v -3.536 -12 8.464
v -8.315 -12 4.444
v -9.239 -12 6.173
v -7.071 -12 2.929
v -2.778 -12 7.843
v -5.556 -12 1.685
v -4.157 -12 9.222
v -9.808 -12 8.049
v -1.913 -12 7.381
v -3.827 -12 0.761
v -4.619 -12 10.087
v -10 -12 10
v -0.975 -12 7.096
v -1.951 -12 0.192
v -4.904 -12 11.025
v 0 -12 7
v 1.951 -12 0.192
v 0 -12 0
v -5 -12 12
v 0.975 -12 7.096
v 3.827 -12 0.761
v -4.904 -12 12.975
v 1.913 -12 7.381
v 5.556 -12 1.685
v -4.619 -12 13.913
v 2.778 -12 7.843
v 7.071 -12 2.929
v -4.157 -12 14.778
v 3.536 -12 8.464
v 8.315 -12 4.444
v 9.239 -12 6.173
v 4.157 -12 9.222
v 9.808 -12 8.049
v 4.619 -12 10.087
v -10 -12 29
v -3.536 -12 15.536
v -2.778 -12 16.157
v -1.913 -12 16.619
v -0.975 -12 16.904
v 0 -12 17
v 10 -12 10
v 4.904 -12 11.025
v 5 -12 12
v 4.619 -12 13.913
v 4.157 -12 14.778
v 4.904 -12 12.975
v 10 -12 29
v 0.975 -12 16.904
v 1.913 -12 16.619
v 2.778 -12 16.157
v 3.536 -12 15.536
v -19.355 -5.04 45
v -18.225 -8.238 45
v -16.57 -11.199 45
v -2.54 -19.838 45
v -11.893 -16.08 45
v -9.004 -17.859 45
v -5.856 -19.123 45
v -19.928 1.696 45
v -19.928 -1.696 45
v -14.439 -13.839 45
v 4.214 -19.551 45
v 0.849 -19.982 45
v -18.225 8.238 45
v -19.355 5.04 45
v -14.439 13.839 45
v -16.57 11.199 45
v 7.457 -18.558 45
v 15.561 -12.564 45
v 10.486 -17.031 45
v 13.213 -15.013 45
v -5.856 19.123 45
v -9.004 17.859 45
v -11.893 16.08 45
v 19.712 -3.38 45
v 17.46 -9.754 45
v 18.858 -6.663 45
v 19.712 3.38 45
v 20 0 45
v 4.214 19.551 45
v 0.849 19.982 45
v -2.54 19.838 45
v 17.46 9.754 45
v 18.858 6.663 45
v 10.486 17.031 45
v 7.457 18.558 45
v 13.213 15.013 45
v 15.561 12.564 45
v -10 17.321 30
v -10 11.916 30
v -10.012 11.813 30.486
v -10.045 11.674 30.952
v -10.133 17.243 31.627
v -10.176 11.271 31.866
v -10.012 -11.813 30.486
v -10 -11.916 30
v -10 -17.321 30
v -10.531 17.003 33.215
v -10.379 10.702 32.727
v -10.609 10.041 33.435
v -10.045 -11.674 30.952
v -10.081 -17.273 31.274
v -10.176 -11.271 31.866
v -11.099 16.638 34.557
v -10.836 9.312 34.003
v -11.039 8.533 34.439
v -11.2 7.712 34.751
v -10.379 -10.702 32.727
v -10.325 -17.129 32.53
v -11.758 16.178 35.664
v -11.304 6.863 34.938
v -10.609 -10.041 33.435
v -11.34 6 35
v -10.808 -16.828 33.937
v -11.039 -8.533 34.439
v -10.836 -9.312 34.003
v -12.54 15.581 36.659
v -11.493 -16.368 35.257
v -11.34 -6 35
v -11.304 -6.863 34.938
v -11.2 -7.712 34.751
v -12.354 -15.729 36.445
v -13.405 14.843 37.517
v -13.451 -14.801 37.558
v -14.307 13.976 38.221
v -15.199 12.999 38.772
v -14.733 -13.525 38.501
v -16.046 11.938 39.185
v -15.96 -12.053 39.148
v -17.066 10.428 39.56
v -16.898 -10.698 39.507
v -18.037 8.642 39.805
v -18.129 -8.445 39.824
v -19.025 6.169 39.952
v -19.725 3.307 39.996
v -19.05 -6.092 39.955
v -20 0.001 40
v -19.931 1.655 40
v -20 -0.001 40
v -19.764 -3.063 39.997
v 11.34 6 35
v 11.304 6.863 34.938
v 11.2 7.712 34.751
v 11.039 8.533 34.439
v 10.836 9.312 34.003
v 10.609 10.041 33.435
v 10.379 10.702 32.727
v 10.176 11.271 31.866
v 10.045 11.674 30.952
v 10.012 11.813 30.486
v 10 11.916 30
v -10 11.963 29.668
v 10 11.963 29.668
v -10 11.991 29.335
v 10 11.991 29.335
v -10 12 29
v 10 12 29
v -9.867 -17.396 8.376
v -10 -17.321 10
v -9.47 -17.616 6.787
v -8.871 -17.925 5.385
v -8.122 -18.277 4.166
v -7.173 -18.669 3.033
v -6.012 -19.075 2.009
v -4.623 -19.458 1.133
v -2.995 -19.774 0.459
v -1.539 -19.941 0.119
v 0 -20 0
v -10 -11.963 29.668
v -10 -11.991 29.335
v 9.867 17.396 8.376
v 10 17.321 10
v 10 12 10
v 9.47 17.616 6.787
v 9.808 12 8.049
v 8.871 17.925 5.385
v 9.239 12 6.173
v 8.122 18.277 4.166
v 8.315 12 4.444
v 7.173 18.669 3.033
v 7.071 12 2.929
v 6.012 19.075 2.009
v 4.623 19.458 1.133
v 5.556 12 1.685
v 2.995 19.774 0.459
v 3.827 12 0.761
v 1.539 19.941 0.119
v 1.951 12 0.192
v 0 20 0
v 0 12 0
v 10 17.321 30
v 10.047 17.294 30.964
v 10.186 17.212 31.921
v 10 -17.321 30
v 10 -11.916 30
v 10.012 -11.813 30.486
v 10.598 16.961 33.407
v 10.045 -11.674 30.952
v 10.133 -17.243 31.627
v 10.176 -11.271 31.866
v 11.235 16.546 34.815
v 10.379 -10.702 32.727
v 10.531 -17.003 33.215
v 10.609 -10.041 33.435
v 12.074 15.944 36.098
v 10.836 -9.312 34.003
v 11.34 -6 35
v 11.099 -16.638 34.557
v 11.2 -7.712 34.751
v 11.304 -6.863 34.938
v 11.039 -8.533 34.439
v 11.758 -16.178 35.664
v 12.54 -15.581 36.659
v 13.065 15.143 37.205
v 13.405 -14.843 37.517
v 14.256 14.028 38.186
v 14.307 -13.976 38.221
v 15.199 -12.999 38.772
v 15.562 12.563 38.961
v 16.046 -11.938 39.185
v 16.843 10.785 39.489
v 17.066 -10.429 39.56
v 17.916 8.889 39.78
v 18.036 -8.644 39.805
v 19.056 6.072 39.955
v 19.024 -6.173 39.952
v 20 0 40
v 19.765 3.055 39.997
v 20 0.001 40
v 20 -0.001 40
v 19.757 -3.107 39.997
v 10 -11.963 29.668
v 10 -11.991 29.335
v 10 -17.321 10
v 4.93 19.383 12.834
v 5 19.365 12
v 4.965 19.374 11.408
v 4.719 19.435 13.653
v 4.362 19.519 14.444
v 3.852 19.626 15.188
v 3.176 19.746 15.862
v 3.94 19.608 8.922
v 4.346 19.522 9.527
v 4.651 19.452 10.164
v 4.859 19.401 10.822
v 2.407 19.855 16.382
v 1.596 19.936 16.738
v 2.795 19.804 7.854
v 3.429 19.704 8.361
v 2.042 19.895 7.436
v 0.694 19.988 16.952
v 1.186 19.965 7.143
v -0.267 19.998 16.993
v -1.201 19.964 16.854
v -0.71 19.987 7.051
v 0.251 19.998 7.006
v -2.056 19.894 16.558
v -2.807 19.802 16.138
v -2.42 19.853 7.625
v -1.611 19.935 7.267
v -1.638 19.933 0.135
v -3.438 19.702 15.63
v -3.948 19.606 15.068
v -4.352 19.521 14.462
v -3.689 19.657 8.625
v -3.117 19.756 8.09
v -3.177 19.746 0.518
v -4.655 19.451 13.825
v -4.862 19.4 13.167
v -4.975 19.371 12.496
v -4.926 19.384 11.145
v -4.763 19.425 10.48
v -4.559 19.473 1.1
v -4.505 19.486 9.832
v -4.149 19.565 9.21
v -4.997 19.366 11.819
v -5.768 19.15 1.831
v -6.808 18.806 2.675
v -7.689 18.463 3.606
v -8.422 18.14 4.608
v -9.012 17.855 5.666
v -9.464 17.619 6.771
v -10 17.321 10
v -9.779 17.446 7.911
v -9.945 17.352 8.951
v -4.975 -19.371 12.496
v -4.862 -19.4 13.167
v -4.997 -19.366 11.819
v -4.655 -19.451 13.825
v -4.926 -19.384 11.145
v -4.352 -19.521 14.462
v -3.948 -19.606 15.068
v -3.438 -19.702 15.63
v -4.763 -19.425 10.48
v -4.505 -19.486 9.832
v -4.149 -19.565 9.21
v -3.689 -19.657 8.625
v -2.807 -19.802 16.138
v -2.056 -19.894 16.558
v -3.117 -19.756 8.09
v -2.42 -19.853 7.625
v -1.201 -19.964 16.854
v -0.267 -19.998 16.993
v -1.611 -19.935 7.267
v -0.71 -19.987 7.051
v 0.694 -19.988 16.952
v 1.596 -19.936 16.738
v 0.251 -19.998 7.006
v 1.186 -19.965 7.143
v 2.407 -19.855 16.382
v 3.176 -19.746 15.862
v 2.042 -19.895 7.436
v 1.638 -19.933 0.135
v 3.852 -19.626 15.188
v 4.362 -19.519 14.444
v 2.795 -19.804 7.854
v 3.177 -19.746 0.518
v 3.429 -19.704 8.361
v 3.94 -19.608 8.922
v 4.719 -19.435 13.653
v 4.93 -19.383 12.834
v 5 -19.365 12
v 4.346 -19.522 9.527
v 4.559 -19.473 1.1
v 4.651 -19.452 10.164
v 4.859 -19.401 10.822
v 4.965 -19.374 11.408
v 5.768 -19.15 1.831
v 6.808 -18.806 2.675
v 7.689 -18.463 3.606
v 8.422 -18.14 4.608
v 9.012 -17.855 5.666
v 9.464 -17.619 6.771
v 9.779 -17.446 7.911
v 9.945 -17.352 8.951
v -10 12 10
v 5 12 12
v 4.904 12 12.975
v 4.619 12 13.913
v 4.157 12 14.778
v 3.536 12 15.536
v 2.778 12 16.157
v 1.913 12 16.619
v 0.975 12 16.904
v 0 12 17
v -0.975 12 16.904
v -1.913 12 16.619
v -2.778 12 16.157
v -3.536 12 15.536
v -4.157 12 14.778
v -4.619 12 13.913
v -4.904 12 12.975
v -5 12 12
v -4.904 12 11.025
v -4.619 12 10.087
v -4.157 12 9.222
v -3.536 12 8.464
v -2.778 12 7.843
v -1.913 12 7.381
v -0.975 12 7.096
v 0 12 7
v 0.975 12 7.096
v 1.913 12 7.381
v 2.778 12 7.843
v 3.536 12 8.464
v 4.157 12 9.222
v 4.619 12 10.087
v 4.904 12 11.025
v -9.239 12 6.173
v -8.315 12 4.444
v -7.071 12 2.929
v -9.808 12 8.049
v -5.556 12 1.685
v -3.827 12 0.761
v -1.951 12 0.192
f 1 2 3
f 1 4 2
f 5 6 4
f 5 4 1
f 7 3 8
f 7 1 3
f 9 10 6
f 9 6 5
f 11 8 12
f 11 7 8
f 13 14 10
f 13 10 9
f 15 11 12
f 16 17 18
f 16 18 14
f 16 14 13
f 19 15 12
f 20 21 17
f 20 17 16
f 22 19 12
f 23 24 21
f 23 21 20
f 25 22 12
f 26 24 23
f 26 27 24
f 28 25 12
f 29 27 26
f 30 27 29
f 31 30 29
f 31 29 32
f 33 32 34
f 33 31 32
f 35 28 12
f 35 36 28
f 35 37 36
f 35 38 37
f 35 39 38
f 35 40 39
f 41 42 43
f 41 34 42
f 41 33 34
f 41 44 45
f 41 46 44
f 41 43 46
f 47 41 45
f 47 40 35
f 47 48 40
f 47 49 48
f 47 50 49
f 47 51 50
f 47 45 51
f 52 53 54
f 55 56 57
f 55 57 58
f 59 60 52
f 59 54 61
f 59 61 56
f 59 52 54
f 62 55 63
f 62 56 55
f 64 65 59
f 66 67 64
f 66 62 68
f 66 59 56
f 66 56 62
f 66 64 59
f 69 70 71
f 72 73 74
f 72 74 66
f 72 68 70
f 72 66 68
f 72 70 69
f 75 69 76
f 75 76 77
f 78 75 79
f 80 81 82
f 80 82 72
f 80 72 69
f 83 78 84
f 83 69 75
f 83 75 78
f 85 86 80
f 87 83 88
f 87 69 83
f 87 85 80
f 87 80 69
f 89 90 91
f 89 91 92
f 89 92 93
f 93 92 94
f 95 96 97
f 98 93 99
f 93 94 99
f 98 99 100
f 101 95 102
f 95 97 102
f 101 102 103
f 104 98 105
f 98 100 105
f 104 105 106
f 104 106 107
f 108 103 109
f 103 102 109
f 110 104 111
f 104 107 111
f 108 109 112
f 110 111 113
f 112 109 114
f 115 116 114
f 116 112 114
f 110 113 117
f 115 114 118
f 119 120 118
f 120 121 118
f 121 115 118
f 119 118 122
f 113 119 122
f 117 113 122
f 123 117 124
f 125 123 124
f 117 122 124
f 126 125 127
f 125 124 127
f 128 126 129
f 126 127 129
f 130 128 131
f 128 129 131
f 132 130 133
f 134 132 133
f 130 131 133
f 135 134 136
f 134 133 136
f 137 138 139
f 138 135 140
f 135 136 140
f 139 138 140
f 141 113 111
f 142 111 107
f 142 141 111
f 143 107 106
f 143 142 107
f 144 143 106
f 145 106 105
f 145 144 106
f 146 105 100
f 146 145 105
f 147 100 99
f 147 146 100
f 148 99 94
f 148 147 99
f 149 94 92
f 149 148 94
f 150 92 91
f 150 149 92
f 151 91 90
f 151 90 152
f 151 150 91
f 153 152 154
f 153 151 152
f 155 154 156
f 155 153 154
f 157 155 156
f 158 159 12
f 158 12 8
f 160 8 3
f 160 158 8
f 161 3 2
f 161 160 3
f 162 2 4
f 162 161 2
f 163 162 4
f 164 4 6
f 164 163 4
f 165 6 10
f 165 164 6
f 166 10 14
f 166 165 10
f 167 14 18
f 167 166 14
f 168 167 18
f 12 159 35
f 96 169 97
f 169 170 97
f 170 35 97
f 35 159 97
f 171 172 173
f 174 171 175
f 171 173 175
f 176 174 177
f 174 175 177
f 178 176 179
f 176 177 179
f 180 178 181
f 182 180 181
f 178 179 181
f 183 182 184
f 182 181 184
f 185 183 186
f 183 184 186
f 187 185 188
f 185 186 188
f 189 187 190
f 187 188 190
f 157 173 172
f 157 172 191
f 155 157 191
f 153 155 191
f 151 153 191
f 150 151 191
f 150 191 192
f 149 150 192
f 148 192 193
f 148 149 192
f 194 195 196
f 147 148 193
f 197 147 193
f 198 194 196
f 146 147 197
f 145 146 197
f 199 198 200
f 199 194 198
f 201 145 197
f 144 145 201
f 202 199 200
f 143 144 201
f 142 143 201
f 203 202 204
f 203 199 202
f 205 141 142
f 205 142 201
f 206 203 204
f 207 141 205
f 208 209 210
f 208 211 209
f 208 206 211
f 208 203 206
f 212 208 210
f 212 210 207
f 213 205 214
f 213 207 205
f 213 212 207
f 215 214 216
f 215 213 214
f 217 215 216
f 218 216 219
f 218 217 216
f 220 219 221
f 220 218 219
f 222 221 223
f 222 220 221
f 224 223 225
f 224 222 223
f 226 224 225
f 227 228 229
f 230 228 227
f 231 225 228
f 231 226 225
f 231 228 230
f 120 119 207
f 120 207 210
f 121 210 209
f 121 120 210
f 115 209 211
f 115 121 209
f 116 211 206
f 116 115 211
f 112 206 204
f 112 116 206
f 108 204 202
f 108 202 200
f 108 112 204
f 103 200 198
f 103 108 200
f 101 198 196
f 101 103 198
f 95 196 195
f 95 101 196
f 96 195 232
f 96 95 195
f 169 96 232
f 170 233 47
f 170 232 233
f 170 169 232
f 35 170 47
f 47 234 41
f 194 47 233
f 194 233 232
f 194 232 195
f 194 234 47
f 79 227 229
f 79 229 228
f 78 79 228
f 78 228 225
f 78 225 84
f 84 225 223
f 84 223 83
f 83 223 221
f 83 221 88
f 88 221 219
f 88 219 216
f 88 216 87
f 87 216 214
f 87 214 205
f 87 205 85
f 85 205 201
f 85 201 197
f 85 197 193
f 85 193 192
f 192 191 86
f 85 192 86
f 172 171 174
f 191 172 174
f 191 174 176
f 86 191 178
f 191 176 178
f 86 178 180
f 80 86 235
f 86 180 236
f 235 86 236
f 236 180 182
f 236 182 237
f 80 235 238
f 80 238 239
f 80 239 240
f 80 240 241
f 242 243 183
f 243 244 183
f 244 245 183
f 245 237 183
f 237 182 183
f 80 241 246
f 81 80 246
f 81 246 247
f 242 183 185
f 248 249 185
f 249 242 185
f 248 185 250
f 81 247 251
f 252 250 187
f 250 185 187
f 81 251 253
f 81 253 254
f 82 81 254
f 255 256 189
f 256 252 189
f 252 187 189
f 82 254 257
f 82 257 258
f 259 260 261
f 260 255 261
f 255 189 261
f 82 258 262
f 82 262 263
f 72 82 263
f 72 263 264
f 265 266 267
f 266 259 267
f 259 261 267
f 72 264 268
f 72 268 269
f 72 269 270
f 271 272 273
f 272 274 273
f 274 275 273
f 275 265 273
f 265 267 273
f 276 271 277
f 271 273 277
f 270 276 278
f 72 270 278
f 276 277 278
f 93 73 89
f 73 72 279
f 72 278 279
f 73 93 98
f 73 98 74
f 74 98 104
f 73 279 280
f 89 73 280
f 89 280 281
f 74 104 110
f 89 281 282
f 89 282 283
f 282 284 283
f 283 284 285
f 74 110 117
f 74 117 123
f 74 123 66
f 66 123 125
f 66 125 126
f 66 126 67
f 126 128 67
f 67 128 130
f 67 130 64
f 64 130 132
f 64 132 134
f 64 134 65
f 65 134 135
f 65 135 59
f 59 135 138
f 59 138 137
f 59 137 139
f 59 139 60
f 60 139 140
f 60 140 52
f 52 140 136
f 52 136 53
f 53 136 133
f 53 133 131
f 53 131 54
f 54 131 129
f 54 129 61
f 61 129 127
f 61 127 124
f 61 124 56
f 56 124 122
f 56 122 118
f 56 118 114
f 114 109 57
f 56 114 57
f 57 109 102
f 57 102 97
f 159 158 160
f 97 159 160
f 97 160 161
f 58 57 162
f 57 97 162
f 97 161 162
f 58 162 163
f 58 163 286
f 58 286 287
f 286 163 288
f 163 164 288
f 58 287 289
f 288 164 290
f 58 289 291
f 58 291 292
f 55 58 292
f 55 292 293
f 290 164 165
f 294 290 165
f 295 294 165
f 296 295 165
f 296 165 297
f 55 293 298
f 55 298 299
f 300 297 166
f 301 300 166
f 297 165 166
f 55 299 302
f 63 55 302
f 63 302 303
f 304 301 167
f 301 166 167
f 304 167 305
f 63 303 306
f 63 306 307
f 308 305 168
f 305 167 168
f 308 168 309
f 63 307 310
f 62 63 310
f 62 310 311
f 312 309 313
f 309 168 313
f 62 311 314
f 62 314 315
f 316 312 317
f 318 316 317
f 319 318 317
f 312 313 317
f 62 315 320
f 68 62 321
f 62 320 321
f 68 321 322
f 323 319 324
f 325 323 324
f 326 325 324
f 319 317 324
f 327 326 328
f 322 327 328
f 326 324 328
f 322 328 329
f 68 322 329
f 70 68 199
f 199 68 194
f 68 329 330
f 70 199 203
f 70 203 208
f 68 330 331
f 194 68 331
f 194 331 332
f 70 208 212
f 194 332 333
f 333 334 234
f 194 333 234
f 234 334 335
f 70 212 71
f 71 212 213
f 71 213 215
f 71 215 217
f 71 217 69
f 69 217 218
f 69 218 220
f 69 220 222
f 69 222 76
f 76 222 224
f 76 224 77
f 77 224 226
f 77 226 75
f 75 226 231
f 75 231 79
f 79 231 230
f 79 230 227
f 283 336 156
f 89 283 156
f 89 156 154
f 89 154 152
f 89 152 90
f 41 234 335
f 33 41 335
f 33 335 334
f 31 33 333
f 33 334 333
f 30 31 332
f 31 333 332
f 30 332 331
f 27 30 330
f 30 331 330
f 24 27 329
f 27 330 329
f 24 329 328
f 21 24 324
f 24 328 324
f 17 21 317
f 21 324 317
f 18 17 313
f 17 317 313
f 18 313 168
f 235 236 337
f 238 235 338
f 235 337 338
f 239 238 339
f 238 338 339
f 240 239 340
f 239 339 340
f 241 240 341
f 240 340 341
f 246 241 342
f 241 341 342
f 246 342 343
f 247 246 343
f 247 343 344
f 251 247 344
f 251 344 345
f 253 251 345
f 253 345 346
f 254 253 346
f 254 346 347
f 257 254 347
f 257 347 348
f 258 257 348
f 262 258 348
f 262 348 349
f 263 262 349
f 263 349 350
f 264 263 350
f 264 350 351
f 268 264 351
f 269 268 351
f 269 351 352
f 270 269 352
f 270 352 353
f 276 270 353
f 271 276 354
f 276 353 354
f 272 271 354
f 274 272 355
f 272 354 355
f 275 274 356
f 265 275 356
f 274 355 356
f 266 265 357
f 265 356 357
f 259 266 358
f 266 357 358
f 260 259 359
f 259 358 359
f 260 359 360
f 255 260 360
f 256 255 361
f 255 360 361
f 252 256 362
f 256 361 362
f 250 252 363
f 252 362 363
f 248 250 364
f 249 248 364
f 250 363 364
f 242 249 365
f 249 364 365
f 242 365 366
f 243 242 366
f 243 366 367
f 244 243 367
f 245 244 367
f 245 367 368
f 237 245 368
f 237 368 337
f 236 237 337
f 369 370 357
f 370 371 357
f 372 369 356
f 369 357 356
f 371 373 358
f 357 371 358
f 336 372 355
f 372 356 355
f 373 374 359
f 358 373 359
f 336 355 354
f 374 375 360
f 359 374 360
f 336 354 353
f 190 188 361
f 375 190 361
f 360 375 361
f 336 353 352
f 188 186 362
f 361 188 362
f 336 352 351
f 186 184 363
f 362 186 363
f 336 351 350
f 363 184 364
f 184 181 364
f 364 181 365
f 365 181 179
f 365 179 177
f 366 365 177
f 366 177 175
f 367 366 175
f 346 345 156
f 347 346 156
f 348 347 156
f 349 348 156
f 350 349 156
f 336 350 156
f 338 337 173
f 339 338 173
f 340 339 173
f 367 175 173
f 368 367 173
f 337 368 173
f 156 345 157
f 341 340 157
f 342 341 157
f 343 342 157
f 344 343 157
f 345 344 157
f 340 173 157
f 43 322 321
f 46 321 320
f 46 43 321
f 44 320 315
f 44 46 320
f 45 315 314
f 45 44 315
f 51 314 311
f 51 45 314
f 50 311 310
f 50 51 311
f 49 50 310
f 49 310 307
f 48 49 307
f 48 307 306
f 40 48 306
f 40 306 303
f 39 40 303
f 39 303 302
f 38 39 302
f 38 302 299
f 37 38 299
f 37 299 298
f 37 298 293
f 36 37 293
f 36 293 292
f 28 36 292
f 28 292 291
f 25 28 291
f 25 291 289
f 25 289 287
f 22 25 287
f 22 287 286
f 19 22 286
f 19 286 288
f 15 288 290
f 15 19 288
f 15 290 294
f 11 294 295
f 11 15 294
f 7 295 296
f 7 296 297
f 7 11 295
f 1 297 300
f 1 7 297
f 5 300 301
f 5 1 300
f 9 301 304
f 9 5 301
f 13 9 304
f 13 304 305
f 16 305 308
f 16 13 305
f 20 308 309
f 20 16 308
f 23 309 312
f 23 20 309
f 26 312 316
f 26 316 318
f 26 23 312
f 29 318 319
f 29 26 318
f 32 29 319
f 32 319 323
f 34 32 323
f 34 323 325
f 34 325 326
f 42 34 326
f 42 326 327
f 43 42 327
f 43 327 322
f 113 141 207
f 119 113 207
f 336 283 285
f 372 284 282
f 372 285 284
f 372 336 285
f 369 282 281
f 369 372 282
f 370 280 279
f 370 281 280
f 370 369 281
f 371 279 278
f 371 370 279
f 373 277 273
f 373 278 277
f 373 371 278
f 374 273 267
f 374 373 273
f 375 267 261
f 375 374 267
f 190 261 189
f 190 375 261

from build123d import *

# Parameters (mm, degrees)
CYLINDER_R           = 20
CYLINDER_DEPTH       = 45
POCKET_DEPTH         = 164.569323
POCKET_DEPTH_BACK    = 164.569323
POCKET001_DEPTH      = 164.569324
POCKET001_DEPTH_BACK = 164.569324
SKETCH002_R          = 5
POCKET002_DEPTH      = 20.001
POCKET002_DEPTH_BACK = 20.001


with BuildPart() as part:
    # Cylinder → Cylinder (join)
    with BuildSketch(Plane.XY):
        Circle(CYLINDER_R)
    extrude(amount=CYLINDER_DEPTH)

    # Sketch → Pocket (cut, two sides)
    with BuildSketch(Plane.XZ) as pocket_sk:
        with BuildLine():
            ThreePointArc((-10, 10), (-7.071068, 2.928932), (0, 0))
            Line((-30, 0), (0, 0))
            Line((-30, 40), (-30, 0))
            Line((-20, 40), (-30, 40))
            ThreePointArc((-10, 30), (-12.928932, 37.071068), (-20, 40))
            Line((-10, 10), (-10, 30))
        make_face()
    pocket = extrude(amount=-POCKET_DEPTH, mode=Mode.SUBTRACT) + extrude(pocket_sk.sketch, amount=POCKET_DEPTH_BACK, mode=Mode.SUBTRACT)

    # Mirrored: Pocket across Sketch V_Axis
    add(pocket.mirror(Plane(origin=(0, 0, 0), x_dir=(0, -1, 0), z_dir=(1, 0, 0))), mode=Mode.SUBTRACT)

    # Sketch001 → Pocket001 (cut, two sides)
    with BuildSketch(Plane.YZ) as pocket001_sk:
        with BuildLine():
            Line((-12, 0), (-12, 29))
            ThreePointArc((-6, 35), (-10.242641, 33.242641), (-12, 29))
            Line((-6, 35), (0, 35))
            Line((0, 35), (0, 0))
            Line((0, 0), (-12, 0))
        make_face()
    pocket001 = extrude(amount=-POCKET001_DEPTH, mode=Mode.SUBTRACT) + extrude(pocket001_sk.sketch, amount=POCKET001_DEPTH_BACK, mode=Mode.SUBTRACT)

    # Mirrored001: Pocket001 across Sketch001 V_Axis
    add(pocket001.mirror(Plane(origin=(0, 0, 0), x_dir=(1, 0, 0), z_dir=(0, 1, 0))), mode=Mode.SUBTRACT)

    # Sketch002 → Pocket002 (cut, two sides)
    with BuildSketch(Plane.XZ) as pocket002_sk:
        with Locations((0, 12)):
            Circle(SKETCH002_R)
    extrude(amount=-POCKET002_DEPTH, mode=Mode.SUBTRACT)
    extrude(pocket002_sk.sketch, amount=POCKET002_DEPTH_BACK, mode=Mode.SUBTRACT)


solid = part.part
